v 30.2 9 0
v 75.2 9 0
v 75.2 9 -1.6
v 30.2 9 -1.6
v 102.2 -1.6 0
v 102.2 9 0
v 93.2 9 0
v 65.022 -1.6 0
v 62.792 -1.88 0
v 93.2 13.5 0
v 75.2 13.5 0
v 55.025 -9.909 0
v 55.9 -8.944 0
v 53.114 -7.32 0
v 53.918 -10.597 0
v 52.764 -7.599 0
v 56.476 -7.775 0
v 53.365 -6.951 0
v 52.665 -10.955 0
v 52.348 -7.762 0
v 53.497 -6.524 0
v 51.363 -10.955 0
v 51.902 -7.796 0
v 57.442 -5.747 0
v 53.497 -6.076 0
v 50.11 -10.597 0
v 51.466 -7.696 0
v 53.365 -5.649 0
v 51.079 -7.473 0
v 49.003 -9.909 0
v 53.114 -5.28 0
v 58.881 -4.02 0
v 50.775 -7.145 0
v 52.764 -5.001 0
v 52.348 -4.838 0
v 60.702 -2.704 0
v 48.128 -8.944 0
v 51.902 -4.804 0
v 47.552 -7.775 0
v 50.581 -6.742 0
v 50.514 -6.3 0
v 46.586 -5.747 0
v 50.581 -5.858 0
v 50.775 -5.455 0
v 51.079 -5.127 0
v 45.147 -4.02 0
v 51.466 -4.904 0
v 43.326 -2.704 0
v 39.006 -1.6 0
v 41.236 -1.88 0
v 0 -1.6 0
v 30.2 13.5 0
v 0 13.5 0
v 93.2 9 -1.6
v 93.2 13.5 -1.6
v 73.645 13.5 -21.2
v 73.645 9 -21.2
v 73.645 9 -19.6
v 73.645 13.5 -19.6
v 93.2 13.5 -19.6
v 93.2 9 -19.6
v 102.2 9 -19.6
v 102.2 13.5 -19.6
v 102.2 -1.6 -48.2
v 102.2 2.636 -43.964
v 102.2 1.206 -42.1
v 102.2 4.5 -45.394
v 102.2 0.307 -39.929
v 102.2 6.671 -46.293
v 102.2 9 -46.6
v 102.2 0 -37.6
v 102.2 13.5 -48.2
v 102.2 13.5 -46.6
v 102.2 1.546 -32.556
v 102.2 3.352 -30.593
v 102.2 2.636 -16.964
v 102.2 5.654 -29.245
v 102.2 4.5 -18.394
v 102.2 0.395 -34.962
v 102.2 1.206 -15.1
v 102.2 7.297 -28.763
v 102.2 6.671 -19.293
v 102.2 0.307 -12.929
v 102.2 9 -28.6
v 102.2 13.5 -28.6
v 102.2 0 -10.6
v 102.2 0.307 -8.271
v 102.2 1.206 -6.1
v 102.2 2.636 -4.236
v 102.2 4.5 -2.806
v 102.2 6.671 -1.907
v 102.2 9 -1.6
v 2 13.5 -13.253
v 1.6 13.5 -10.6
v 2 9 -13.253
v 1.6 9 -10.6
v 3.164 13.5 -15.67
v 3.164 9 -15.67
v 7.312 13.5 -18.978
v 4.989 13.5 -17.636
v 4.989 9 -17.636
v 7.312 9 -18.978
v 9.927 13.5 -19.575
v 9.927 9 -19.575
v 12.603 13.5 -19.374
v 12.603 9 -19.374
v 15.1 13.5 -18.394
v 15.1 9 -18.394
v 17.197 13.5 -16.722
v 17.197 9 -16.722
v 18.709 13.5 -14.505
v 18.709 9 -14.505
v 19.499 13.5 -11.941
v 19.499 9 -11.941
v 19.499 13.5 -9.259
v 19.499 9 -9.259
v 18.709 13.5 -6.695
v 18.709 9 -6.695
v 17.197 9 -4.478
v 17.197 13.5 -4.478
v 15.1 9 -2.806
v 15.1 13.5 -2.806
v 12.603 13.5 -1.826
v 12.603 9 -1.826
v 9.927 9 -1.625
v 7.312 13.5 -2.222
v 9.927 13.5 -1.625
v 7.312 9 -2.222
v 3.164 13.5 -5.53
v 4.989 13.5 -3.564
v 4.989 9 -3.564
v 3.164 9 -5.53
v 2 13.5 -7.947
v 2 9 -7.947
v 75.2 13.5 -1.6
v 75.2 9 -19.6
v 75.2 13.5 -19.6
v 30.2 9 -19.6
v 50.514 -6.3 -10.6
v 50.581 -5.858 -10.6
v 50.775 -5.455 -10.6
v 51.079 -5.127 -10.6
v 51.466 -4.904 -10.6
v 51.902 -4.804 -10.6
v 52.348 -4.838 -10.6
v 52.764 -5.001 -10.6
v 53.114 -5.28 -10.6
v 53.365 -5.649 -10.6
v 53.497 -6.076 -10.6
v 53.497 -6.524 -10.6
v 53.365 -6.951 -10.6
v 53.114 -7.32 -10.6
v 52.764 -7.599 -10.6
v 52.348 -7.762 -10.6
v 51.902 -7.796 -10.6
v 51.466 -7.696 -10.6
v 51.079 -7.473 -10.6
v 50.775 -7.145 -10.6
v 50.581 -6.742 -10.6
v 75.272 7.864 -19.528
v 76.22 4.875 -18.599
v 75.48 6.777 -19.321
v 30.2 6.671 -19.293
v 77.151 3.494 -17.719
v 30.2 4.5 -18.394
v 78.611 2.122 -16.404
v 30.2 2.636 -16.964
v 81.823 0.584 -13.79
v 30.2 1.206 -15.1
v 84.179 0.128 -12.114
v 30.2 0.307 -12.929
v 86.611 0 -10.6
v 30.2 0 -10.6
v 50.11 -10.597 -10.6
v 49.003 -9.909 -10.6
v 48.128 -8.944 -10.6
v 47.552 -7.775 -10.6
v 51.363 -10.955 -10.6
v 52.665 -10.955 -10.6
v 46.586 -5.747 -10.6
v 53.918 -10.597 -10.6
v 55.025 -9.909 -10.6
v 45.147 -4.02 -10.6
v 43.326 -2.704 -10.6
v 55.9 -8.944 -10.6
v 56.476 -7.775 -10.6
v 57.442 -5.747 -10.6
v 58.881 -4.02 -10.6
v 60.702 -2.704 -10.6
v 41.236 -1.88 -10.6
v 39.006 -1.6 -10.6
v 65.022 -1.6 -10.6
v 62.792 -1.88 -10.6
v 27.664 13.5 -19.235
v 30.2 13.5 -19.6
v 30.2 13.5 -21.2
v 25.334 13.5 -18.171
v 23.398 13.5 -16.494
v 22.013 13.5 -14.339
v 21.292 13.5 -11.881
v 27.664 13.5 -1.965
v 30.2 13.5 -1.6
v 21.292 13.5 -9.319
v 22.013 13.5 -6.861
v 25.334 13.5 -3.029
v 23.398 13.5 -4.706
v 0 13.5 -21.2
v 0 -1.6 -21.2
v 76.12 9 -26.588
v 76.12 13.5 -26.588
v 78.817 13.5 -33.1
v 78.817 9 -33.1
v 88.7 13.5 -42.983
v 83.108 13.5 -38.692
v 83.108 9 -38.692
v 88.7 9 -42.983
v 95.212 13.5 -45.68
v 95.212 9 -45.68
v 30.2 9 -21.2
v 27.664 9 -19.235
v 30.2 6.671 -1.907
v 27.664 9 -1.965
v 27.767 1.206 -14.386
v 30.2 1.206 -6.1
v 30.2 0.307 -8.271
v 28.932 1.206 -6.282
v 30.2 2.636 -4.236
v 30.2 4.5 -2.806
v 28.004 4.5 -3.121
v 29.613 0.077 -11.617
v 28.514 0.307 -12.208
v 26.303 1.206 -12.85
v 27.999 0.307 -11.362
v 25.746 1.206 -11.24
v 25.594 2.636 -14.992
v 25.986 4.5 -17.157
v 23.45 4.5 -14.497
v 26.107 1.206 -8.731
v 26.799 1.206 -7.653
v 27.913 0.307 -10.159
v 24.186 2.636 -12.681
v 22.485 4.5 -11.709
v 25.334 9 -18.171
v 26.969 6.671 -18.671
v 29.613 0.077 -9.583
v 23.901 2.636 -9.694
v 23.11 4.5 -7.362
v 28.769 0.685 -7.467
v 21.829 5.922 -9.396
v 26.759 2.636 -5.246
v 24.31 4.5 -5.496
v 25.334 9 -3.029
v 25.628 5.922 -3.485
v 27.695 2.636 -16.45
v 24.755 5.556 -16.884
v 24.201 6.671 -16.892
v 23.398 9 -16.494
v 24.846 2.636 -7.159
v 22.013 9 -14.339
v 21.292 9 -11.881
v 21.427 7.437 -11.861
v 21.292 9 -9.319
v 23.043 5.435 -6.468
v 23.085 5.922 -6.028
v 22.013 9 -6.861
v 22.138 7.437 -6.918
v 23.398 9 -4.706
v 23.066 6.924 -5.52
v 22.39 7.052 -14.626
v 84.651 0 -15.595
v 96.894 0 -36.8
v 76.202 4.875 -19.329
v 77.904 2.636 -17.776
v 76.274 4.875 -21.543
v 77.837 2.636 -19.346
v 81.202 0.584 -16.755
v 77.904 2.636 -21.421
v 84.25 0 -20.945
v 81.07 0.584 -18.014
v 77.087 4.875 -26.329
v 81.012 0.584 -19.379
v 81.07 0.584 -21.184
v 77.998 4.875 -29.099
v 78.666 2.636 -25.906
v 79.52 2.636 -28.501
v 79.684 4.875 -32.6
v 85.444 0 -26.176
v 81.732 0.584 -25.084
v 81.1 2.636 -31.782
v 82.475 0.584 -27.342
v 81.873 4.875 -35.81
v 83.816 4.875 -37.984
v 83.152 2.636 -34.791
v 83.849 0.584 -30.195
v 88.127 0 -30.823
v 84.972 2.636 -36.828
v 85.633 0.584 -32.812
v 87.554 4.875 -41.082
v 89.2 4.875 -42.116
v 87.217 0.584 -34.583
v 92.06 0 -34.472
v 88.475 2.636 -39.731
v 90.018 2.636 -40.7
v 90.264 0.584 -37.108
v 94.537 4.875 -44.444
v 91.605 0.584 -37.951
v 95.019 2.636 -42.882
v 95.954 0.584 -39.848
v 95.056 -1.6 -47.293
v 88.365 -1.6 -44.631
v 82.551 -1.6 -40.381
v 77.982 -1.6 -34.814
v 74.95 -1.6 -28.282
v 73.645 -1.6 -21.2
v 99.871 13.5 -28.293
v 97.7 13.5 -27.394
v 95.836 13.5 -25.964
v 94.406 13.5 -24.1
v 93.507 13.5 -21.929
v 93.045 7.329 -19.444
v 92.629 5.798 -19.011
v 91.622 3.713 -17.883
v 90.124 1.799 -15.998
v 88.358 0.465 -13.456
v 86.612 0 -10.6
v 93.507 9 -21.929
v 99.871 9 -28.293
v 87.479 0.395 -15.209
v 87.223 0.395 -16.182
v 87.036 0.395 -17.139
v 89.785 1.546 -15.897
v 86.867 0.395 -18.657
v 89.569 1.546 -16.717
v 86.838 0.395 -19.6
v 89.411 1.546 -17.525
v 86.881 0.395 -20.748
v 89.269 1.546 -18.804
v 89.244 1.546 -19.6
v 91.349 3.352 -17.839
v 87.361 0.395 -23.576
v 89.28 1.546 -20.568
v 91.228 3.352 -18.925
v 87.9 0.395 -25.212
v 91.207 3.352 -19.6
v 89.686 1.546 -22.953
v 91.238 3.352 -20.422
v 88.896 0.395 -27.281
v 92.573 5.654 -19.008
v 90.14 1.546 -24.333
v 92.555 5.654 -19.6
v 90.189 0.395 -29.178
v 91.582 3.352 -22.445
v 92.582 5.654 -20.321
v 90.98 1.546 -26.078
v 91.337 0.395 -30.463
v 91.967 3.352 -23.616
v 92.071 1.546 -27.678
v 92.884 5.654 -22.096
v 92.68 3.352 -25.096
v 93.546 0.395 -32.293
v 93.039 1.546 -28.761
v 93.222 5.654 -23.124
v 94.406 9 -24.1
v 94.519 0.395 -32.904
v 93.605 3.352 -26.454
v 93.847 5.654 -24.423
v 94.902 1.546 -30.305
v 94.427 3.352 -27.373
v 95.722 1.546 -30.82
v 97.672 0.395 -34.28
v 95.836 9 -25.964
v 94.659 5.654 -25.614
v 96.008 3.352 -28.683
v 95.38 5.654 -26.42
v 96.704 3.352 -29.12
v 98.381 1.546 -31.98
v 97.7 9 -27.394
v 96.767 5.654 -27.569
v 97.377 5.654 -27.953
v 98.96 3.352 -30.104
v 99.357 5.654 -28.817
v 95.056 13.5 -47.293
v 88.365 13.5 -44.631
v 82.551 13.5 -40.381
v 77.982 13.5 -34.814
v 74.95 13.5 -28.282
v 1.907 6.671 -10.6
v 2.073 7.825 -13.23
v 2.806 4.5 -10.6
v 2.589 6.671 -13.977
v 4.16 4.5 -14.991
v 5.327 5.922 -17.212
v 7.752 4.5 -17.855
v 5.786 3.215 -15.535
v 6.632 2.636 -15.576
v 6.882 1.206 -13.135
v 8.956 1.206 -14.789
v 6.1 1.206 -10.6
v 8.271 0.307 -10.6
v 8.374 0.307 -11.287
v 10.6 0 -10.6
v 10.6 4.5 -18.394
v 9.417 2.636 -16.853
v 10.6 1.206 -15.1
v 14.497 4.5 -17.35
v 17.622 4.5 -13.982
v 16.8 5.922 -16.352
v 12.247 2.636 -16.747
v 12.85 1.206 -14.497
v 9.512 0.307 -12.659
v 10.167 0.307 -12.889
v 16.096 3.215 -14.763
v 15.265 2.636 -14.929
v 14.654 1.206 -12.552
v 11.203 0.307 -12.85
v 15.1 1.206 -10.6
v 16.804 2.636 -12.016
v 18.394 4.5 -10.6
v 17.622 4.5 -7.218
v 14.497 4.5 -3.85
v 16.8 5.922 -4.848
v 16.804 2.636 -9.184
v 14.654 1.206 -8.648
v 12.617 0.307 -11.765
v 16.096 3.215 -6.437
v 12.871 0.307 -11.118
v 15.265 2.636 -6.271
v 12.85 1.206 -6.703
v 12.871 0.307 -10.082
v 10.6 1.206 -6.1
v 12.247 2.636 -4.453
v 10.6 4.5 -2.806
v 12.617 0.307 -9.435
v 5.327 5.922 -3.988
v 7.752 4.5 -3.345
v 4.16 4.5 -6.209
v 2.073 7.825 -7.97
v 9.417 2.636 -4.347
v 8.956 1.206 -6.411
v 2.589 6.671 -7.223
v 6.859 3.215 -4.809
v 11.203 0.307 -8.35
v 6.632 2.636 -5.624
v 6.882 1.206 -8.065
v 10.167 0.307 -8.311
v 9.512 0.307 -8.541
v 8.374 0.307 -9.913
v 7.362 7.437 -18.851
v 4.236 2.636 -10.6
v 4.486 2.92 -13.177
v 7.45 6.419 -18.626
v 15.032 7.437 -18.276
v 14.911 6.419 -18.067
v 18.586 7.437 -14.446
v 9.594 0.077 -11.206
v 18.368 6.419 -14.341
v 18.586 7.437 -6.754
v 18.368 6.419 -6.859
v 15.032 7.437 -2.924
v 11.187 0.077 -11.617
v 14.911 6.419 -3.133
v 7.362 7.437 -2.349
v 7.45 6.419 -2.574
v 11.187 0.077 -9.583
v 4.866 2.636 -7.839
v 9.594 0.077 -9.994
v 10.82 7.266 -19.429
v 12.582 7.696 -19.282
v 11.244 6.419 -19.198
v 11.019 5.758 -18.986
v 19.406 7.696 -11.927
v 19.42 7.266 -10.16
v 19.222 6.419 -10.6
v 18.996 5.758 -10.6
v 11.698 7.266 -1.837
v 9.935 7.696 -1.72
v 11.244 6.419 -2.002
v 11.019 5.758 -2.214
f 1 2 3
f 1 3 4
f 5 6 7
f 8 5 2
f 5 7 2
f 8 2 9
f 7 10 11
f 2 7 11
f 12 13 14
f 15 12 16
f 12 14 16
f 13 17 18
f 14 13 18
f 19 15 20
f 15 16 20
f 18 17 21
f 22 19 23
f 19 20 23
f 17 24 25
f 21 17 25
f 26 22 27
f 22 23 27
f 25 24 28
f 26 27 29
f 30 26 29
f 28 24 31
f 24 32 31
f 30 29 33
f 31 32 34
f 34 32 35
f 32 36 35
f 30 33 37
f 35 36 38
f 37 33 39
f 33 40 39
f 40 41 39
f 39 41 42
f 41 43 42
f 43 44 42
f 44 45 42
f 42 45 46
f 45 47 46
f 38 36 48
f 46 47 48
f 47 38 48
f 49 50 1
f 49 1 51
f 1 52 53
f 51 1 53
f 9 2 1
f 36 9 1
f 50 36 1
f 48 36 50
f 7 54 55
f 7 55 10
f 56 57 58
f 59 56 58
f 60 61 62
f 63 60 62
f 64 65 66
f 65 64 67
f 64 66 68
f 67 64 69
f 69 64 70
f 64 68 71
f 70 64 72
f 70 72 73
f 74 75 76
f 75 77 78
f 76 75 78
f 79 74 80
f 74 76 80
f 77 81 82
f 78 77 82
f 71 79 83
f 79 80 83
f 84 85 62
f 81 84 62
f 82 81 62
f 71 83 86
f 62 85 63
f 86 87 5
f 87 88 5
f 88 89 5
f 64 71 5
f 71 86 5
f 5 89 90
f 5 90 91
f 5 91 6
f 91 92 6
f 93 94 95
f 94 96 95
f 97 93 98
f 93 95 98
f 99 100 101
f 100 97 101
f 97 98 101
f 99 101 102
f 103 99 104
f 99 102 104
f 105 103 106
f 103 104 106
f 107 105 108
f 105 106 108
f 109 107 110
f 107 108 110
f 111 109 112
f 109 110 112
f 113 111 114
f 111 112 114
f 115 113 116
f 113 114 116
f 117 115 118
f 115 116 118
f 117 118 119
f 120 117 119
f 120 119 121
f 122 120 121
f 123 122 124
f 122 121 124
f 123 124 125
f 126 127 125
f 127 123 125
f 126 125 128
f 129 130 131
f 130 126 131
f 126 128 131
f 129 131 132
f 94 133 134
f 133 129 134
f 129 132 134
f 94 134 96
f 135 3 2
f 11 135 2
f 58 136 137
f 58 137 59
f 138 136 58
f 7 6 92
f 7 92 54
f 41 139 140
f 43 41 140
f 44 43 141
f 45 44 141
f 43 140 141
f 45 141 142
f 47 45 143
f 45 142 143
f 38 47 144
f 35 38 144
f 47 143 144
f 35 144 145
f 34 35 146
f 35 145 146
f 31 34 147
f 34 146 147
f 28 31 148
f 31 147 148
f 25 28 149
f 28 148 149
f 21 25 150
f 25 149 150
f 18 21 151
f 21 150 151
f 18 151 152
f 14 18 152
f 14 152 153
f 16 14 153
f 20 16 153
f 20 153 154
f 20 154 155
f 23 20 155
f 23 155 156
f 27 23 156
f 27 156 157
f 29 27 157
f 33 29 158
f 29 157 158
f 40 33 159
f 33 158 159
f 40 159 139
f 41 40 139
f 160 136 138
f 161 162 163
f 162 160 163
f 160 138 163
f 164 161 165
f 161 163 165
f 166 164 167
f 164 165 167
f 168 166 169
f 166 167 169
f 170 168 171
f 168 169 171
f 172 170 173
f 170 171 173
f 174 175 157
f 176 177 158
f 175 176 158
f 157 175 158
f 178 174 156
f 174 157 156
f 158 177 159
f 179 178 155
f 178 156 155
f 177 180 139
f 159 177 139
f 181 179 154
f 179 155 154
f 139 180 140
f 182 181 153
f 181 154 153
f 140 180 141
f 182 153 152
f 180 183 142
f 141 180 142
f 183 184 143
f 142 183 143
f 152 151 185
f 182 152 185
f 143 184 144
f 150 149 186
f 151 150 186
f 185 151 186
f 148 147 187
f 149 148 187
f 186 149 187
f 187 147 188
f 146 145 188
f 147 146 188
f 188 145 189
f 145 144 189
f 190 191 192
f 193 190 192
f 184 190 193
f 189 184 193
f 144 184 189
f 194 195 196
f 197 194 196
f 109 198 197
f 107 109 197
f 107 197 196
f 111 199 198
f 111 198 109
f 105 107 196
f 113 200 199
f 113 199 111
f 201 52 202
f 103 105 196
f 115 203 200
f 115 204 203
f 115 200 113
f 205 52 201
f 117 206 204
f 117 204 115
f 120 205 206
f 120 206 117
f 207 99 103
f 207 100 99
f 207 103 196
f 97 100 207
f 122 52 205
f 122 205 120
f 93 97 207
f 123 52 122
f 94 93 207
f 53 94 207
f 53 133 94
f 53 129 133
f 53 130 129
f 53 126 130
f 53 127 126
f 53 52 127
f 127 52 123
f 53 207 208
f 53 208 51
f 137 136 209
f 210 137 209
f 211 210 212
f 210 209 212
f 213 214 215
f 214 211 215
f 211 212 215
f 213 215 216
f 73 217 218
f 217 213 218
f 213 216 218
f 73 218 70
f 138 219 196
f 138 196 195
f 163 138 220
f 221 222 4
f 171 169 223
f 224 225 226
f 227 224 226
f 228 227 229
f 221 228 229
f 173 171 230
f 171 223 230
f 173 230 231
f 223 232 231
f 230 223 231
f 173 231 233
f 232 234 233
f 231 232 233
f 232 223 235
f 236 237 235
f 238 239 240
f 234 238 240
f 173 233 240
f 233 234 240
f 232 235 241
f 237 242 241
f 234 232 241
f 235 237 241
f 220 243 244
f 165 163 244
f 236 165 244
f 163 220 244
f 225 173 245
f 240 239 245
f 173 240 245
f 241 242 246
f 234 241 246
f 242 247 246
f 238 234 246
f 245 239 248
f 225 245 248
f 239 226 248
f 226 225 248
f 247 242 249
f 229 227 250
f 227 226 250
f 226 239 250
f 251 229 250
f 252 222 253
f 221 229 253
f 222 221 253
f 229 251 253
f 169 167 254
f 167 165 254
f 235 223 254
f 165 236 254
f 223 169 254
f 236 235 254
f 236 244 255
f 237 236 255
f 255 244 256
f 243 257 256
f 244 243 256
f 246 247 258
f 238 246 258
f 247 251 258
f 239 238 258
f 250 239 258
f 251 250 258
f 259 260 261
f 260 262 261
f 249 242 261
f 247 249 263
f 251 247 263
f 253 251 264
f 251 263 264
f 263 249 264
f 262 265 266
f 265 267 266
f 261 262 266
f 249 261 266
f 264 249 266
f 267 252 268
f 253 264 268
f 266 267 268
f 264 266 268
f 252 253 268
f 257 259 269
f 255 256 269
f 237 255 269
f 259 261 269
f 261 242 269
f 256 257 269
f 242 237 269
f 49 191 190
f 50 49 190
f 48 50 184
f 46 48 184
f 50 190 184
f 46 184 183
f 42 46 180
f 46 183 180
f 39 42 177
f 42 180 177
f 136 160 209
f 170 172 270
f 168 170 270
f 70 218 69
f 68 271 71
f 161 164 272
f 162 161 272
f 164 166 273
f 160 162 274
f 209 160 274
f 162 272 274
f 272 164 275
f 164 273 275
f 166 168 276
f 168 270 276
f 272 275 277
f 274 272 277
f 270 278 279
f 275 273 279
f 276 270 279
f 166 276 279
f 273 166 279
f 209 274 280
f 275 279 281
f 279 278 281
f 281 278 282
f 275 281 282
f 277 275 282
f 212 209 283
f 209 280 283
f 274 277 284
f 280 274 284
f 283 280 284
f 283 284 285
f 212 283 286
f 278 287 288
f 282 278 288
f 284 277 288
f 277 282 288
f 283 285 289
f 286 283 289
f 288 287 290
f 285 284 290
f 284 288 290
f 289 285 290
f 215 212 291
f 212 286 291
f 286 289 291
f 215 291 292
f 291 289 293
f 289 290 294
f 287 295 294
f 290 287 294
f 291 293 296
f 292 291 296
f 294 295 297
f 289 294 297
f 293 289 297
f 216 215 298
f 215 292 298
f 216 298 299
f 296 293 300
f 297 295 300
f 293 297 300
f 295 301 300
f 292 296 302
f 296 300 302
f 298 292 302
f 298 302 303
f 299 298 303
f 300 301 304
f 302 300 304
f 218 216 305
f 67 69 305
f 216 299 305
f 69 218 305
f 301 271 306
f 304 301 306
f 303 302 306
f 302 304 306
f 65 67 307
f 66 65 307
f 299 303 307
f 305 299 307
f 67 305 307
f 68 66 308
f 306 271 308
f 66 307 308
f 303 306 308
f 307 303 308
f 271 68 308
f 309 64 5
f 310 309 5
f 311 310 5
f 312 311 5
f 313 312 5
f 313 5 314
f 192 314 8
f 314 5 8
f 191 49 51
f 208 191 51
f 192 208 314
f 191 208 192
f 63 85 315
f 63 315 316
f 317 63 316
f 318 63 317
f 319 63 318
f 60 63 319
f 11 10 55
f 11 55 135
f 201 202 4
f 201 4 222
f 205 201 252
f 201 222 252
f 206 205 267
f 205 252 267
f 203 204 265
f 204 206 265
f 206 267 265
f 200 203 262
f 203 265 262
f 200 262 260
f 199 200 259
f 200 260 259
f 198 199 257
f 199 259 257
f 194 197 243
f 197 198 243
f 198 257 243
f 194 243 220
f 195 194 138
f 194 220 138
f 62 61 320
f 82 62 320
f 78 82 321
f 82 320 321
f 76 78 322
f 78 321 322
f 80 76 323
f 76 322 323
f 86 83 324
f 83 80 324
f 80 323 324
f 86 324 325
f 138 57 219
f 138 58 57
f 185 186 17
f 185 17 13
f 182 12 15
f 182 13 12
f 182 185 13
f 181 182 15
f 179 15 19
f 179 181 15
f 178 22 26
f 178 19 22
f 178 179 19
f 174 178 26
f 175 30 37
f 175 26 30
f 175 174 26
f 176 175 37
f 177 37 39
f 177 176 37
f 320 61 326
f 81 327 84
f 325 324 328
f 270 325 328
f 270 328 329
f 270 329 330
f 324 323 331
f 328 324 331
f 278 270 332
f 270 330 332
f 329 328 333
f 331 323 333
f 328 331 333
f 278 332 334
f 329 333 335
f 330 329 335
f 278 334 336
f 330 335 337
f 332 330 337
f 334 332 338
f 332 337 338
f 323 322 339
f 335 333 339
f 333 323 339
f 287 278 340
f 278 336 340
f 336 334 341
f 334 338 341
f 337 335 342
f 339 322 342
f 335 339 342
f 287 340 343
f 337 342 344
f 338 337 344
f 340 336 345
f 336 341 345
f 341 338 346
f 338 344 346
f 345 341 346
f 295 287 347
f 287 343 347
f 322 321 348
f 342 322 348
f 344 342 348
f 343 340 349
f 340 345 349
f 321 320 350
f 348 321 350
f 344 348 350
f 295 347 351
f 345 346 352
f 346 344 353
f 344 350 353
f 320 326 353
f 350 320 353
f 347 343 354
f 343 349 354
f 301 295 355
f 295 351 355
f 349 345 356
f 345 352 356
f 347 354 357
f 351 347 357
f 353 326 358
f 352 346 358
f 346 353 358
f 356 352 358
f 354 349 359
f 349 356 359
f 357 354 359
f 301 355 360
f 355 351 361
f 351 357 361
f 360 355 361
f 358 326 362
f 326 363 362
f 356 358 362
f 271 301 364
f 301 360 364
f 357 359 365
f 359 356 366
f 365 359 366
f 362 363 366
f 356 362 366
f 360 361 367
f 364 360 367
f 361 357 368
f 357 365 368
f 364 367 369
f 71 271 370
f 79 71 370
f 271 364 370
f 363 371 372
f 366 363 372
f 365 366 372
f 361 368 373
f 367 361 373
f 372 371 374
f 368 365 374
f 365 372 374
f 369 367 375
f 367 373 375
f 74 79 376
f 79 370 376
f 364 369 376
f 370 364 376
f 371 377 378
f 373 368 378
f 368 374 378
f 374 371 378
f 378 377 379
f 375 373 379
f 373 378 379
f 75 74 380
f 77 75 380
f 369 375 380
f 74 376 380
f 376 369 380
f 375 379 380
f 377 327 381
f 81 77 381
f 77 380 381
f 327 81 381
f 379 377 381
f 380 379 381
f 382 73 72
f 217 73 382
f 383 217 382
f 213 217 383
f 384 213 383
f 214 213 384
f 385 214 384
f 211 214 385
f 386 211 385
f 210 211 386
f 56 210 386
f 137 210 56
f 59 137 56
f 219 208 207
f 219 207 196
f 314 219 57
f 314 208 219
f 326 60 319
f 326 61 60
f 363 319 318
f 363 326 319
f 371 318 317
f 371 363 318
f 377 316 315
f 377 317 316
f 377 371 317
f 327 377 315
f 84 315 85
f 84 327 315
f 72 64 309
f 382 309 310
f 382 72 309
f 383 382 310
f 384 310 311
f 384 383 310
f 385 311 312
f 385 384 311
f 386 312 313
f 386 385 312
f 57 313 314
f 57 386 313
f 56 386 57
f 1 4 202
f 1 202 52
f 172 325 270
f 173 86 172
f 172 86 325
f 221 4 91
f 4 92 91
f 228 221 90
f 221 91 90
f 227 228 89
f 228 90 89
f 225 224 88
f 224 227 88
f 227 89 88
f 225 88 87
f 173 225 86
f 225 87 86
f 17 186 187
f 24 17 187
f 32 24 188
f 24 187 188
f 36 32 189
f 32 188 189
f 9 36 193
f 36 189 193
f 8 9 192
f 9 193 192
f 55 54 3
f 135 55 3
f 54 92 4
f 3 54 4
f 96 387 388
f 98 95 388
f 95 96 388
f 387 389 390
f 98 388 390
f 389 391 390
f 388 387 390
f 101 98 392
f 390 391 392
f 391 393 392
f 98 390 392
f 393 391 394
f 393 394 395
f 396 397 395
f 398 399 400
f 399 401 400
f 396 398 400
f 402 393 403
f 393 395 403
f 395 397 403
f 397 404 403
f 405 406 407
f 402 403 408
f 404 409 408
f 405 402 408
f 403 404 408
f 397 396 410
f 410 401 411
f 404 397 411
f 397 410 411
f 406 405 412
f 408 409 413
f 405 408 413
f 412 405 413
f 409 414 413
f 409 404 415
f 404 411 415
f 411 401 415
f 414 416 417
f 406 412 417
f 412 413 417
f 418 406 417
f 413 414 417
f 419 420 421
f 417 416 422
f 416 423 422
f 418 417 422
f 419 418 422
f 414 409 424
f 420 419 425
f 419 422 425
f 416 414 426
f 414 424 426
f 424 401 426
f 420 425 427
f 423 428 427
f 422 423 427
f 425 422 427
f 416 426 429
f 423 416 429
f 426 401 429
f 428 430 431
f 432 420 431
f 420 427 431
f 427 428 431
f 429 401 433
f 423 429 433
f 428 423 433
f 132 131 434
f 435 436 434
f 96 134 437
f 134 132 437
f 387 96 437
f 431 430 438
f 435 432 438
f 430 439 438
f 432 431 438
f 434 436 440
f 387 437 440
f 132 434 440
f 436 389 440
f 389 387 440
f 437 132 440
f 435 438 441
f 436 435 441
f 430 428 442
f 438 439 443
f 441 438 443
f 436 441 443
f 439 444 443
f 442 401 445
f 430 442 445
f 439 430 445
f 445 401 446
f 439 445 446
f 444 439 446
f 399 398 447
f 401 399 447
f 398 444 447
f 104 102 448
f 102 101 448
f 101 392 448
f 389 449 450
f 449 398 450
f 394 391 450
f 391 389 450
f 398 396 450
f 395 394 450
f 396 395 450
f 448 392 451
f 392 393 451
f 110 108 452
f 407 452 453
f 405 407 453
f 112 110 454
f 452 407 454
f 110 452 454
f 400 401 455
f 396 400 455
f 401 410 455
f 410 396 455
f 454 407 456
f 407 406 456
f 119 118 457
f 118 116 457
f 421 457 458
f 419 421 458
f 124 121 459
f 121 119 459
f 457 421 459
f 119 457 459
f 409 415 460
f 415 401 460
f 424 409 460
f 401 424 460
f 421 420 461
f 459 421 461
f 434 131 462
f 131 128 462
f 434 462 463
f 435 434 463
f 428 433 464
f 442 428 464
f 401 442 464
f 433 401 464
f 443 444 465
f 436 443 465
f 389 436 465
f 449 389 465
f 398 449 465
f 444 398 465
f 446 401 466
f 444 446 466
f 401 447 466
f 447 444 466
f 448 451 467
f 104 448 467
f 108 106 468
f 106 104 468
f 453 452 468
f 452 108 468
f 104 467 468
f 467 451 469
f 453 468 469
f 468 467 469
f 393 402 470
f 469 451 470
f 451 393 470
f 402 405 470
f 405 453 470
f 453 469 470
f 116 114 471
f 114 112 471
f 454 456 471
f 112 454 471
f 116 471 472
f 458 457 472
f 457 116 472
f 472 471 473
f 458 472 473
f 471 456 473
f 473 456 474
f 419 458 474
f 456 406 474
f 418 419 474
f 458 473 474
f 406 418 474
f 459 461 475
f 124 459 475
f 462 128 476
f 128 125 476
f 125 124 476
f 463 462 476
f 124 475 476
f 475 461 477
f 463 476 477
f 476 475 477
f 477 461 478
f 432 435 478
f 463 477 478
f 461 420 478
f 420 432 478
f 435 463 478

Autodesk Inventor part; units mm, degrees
ref_plane "YZ Plane" through (0, 0, 0) normal (1, 0, 0) x (0, 1, 0)
ref_plane "XZ Plane" through (0, 0, 0) normal (0, 1, 0) x (-1, 0, 0)
ref_plane "XY Plane" through (0, 0, 0) normal (0, 0, 1) x (1, 0, 0)
sketch "Esboço1" plane through (0, 0, 0) normal (0, 1, 0) x (-1, 0, 0)
  arc A0 (-102.2, -28.6) -> (-93.2, -19.6) centre (-102.2, -19.6) ccw
  arc A1 (-102.2, -46.6) -> (-75.2, -19.6) centre (-102.2, -19.6) ccw
  line L0 (-75.2, -19.6) -> (-30.2, -19.6)
  line L1 (-93.2, -19.6) -> (-102.2, -19.6)
  line L2 (-102.2, -19.6) -> (-102.2, -1.6)
  line L3 (-102.2, -1.6) -> (-93.2, -1.6)
  line L4 (-93.2, -1.6) -> (-75.2, -1.6)
  line L5 (-75.2, -1.6) -> (-30.2, -1.6)
  arc A2 (-30.2, -19.6) -> (-30.2, -1.6) centre (-30.2, -10.6) ccw
  line L6 (-102.2, -28.6) -> (-102.2, -46.6)
  arc A3 (-102.2, -48.2) -> (-73.6448, -21.2) centre (-102.2, -19.6) ccw
  arc A4 (-102.2, -27) -> (-94.975, -21.2) centre (-102.2, -19.6) ccw
  line L7 (-94.975, -21.2) -> (-102.2, -21.2)
  line L8 (-102.2, 0) -> (-93.2, 0)
  line L9 (-93.2, 0) -> (-75.2, 0)
  line L10 (-75.2, 0) -> (0, 0)
  line L11 (0, -21.2) -> (-73.6448, -21.2)
  line L12 (-73.6448, -21.2) -> (-73.6448, -19.6)
  line L13 (-102.2, -46.6) -> (-102.2, -48.2)
  line L14 (-102.2, -28.6) -> (-102.2, -27)
  line L15 (-102.2, -21.2) -> (-102.2, -19.6)
  line L16 (-102.2, -1.6) -> (-102.2, 0)
  line L17 (-94.975, -21.2) -> (-94.975, -19.6)
  line L18 (-93.2, -1.6) -> (-93.2, 0)
  line L19 (-75.2, -1.6) -> (-75.2, 0)
  line L20 (0, -21.2) -> (0, 0)
  circle A5 centre (-10.6, -10.6) radius 9
  line L21 (-30.2, -21.2) -> (-30.2, -19.6)
  line L22 (-30.2, -1.6) -> (-30.2, 0)
  line L23 (-102.2, -21.2) -> (-102.2, -27)
  point P0 (-21.2, -10.6)
  point P1 (-73.6448, -21.2)
  point P2 (-30.2, -1.6)
  point P3 (-30.2, -19.6)
  dimension "d20" = 18
  dimension "d21" = 18
  dimension "d22" = 54
  dimension "d23" = 1.6
  dimension "d30" = 1.6
  dimension "d31" = 1.6
  dimension "d32" = 1.6
  dimension "d33" = 9
  dimension "d35" = 18
  dimension "d38" = 1.6
  dimension "d44" = 1.6
  dimension "d45" = 1.6
extrude "Margem externa" add sketch "Esboço1" against normal blind 1.6 contours L14 A4 L17 L1 A0 | A0 L1 L2 L3 L4 L5 A2 L0 A1 L6 | A1 L0 L12 A3 L13 | L23 L7 A4 | L17 L7 L15 L1 | L0 L21 L11 L12 | L16 L8 L18 L3 | A2 L22 L10 L20 L11 L21 | L18 L9 L19 L4 | L5 L19 L10 L22 | A5
extrude "Proteção alta" add sketch "Esboço1" along normal blind 13.5 contours L14 A4 L17 L1 A0 | A1 L0 L12 A3 L13 | L23 L7 A4 | L17 L7 L15 L1 | A2 L22 L10 L20 L11 L21 | L18 L9 L19 L4
extrude "Proteção baixa" add sketch "Esboço1" along normal blind 9 contours L14 A4 L17 L1 A0 | A1 L0 L12 A3 L13 | L17 L7 L15 L1 | L0 L21 L11 L12 | L16 L8 L18 L3 | A2 L22 L10 L20 L11 L21 | L18 L9 L19 L4 | L5 L19 L10 L22
fillet "Arredondamento3" radius 9 7 edges at (19.6, 0, -10.6) (66.2, 0, -1.6) (52.7, 0, -19.6) (21.2, 0, -10.6) (83.1081, 0, -38.6919) (97.7, 0, -19.6) (95.836, 0, -25.964)
sketch "Esboço2" plane through (0, -1.6, 0) normal (0, -1, 0) x (1, 0, 0)
  line L0 (59.514, 0) -> (44.514, 0)
  line L1 (44.514, 0) -> (44.514, -10.6)
  line L2 (44.514, -10.6) -> (59.514, -10.6)
  line L3 (59.514, -10.6) -> (59.514, 0)
  line L4 (0, 0) -> (0, -21.2) projected
  point P0 (52.014, -10.6)
  point P1 (0, -10.6)
  point P2 (52.014, 0)
  dimension "d47" = 52.014
  dimension "d48" = 15
extrude "Extrusão5" add sketch "Esboço2" along normal blind 9.4
sketch "Esboço3" plane through (59.514, -1.6, -10.6) normal (0, 0, -1) x (-1, 0, 0)
  circle A0 centre (7.5, -4.7) radius 1.5
  line L0 (15, -9.4) -> (0, -9.4) projected
  line L1 (15, 0) -> (15, -9.4) projected
  line L2 (59.514, 0) -> (-14.1308, 0) projected
  line L3 (12.2, 0) -> (15, 0)
  line L4 (15, 0) -> (15, -9.4)
  line L5 (15.1598, -9.4) -> (0, -9.4)
  line L6 (0, -9.4) -> (0, 0)
  line L7 (0, 0) -> (2.8, 0)
  circle A1 centre (7.5, -4.7) radius 4.7
  line L8 (12.2, 0) -> (12.2, -4.7)
  line L9 (2.8, 0) -> (2.8, -4.7)
  point P0 (59.514, 1.6)
  point P1 (7.5, -9.4)
  point P2 (15, -4.7)
  point P3 (9, -4.7)
  point P4 (6, -4.7)
  point P5 (7.5, -9.4)
  dimension "d51" = 3
  dimension "d54" = 3.2
extrude "Extrusão6" cut sketch "Esboço3" against normal through all contours A0 | L0 A1 L8 L2 L1 | L0 L6 L2 L9 A1
fillet "Arredondamento4" radius 9 2 edges at (56.714, -1.6, -5.3) (47.314, -1.6, -5.3)
equation "\"d20\" = Esfera"
equation "\"d21\" = Esfera"
equation "\"d22\" = 3 * Esfera"
equation "\"d23\" = Margem"
equation "\"d30\" = Margem"
equation "\"d31\" = Margem"
equation "\"d28\" = Margem"
equation "\"d24\" = 0.75 * Esfera"
equation "\"Esfera\" = 18"
equation "\"Margem\" = 1.6"
equation "\"Furo\" = 3"
properties part number "Trilho 5 min" material "Plástico PET"
